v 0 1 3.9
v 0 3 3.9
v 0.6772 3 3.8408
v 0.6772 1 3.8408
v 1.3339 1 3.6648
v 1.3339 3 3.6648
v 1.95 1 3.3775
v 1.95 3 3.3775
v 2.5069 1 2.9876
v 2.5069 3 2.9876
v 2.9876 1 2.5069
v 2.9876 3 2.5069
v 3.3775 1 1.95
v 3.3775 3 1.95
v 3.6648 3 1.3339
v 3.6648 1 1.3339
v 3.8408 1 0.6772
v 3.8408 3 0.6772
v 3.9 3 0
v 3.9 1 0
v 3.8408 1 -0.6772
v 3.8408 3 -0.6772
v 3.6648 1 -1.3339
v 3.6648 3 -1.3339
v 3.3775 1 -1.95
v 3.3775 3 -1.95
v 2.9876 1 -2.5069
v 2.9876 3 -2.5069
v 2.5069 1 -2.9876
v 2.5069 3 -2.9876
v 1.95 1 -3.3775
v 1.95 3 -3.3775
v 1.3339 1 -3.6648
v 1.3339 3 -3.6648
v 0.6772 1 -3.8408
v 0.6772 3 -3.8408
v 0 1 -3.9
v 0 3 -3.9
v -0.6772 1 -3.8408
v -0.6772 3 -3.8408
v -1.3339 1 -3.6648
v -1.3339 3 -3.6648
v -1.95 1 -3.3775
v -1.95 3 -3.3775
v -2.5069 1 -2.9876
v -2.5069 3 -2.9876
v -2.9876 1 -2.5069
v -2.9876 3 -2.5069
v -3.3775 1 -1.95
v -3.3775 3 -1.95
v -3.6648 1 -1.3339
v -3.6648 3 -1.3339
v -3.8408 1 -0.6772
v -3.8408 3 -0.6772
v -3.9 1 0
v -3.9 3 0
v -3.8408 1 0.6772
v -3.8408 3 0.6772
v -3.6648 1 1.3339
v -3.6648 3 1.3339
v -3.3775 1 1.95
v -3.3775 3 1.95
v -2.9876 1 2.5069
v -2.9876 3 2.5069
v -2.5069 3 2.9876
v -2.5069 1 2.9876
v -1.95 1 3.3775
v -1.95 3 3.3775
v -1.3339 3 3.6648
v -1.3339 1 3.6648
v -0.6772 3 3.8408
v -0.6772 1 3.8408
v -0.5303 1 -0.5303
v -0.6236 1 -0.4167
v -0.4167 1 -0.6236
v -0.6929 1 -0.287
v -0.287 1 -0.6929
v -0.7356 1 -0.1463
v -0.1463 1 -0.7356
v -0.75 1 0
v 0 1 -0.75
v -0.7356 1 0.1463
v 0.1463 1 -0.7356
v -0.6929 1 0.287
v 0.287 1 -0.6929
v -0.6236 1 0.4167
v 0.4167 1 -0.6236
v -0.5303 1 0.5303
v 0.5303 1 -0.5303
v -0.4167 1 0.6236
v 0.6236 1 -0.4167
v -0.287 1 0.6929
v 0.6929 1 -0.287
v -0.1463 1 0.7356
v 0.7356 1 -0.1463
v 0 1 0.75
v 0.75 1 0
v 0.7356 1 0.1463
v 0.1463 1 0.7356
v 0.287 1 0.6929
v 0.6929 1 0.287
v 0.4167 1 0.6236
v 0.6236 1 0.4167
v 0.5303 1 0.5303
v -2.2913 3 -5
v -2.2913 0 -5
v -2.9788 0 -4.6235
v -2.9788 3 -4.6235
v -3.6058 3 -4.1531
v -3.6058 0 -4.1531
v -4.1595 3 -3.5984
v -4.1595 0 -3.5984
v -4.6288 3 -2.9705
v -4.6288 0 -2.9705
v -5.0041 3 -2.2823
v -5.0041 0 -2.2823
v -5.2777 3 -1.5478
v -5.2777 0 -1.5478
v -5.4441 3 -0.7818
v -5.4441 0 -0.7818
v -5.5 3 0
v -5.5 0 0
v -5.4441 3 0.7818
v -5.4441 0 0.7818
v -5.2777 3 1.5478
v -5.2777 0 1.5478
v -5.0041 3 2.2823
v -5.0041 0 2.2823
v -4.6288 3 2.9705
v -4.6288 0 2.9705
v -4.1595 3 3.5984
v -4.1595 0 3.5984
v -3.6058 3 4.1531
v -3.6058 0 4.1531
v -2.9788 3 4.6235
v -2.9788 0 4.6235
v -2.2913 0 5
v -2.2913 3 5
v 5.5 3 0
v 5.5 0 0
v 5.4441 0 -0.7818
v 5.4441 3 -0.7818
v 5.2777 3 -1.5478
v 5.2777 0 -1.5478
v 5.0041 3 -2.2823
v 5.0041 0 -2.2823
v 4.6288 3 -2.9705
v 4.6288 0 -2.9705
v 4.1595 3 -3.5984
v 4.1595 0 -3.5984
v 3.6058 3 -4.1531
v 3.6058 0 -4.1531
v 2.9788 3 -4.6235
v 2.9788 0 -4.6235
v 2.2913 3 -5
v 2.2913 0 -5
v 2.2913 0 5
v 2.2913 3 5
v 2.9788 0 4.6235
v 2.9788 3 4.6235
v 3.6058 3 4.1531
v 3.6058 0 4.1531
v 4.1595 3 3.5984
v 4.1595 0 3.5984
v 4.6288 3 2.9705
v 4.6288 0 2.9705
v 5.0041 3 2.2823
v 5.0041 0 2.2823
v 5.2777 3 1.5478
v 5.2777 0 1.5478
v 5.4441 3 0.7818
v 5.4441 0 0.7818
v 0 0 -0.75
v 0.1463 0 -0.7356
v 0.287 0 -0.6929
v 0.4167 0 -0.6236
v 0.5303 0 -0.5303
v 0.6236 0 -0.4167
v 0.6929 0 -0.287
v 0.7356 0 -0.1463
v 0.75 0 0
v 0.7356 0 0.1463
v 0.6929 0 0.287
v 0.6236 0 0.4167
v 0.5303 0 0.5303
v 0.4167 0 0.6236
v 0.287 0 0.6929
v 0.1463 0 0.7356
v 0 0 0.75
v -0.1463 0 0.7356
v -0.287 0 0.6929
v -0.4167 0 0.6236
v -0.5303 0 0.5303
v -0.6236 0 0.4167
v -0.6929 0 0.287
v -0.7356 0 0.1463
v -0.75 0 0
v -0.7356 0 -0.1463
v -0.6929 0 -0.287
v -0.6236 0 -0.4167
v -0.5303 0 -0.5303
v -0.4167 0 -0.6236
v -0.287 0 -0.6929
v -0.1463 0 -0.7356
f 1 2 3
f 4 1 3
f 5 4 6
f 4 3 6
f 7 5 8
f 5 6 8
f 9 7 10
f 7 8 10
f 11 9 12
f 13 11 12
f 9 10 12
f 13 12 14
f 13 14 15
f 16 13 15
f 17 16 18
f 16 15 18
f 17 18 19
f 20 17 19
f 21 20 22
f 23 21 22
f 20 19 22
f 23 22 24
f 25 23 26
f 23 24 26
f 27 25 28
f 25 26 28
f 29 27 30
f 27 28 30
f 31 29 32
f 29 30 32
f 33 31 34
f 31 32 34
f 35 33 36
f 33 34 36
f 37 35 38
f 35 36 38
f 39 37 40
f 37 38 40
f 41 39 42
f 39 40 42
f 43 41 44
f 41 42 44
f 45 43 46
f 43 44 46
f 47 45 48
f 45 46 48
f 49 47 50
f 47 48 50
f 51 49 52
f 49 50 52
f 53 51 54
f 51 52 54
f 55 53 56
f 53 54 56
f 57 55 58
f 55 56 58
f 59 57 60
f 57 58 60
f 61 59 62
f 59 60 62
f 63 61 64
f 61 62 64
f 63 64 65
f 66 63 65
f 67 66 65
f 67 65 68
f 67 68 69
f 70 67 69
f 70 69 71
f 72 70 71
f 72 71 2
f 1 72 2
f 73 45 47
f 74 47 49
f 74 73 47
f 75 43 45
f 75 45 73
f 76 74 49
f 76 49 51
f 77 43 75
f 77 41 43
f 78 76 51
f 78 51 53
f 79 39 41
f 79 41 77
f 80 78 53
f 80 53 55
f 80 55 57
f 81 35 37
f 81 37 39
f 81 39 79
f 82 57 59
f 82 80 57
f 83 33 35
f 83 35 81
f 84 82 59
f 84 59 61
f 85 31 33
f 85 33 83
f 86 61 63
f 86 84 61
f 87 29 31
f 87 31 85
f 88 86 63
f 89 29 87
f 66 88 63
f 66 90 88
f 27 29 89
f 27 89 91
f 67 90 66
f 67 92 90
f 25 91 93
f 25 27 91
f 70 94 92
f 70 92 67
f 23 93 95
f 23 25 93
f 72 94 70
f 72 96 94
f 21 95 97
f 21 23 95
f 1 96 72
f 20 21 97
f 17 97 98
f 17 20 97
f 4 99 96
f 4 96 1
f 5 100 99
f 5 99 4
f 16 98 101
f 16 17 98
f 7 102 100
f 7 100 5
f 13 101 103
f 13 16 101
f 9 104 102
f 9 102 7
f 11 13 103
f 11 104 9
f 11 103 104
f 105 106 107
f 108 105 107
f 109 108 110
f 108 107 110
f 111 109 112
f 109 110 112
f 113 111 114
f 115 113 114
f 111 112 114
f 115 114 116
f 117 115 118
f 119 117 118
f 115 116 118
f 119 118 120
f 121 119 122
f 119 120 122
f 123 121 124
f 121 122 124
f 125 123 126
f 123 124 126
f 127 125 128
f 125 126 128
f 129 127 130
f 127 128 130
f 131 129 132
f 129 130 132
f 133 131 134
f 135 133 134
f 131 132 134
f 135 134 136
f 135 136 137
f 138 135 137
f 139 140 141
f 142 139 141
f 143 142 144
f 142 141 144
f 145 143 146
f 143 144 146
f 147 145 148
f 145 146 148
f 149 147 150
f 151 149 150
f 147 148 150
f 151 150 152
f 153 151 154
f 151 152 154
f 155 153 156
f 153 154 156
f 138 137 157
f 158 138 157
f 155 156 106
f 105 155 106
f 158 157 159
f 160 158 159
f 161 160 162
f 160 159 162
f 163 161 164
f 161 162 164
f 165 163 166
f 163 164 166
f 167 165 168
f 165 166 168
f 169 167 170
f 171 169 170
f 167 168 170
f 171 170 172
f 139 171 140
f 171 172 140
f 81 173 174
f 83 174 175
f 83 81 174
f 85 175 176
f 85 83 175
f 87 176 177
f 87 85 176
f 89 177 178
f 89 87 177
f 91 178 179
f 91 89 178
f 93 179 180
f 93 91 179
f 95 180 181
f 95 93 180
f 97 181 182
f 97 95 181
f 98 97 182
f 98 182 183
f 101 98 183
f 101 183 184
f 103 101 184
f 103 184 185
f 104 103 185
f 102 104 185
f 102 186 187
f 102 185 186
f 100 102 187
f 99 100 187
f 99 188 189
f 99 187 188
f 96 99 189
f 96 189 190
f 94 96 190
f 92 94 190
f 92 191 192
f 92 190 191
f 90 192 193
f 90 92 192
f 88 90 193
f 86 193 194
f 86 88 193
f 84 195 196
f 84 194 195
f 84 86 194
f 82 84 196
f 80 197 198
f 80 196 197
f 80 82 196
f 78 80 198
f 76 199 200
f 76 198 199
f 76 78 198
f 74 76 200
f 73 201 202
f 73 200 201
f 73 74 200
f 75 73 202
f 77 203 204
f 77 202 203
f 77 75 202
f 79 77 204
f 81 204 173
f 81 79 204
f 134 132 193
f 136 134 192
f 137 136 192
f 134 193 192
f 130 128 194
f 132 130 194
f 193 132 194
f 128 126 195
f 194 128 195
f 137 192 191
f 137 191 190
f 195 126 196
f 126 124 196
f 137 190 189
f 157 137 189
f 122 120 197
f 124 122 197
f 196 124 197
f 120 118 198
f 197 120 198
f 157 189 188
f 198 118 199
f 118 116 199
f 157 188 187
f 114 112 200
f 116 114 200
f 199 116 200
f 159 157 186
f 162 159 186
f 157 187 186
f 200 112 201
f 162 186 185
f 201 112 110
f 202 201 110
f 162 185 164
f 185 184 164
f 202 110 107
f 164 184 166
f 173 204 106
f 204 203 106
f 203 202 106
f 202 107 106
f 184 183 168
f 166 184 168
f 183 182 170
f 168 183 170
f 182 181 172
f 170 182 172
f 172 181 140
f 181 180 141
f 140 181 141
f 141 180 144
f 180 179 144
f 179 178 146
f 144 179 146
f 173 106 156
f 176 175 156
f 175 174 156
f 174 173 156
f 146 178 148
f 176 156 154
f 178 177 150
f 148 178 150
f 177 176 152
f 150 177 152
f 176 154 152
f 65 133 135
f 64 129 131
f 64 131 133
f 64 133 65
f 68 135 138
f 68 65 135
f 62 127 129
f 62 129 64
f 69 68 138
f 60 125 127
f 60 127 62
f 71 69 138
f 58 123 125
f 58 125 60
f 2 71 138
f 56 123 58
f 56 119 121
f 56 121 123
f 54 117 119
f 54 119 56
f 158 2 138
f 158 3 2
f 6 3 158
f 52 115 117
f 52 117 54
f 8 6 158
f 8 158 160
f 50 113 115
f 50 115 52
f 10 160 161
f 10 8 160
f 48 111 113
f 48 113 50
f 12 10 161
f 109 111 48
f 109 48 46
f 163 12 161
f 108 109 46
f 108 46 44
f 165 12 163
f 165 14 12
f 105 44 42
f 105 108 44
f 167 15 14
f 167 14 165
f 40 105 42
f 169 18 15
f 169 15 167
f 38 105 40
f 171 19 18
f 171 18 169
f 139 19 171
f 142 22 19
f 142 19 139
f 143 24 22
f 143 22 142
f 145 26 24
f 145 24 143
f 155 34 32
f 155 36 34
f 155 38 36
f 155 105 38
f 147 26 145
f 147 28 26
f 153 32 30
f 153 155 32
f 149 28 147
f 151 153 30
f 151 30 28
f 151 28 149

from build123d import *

# Parameters (mm, degrees)
SKETCH_1_R          = 5
EXTRUDE_1_DEPTH     = 3
SKETCH_2_R          = 3.9
CUT_EXTRUDE_1_DEPTH = 2
SKETCH_3_R          = 0.75
CUT_EXTRUDE_2_DEPTH = 8.697402159


with BuildPart() as part:
    # 草图1 → 凸台-拉伸1 (new body)
    with BuildSketch(Plane(origin=(0, 0, 0), x_dir=(1, 0, 0), z_dir=(0, 1, 0))):
        with BuildLine():
            ThreePointArc((-2.291287847, 5), (-5.5, 0), (-2.291287847, -5))
            Line((-2.291287847, -5), (0, -5))
            ThreePointArc((0, -5), (-5, 0), (0, 5))
            Line((0, 5), (-2.291287847, 5))
        make_face()
        with BuildLine():
            ThreePointArc((5, 0), (3.535533906, -3.535533906), (0, -5))
            Line((0, -5), (2.291287847, -5))
            ThreePointArc((2.291287847, -5), (4.628827236, -2.970514841), (5.5, 0))
            ThreePointArc((5.5, 0), (4.628827236, 2.970514841), (2.291287847, 5))
            Line((2.291287847, 5), (0, 5))
            ThreePointArc((0, 5), (3.535533906, 3.535533906), (5, 0))
        make_face()
        Circle(SKETCH_1_R)
    extrude(amount=EXTRUDE_1_DEPTH)

    # 草图2 → 切除-拉伸1 (cut)
    with BuildSketch(Plane(origin=(0, 3, 0), x_dir=(1, 0, 0), z_dir=(0, 1, 0))):
        with Locations(Location((0, 0, 0), (0, 0, 270))):
            Circle(SKETCH_2_R)
    extrude(amount=-CUT_EXTRUDE_1_DEPTH, mode=Mode.SUBTRACT)

    # 草图3 → 切除-拉伸2 (cut, through all)
    with BuildSketch(Plane(origin=(0, 1, 0), x_dir=(-1, 0, 0), z_dir=(0, -1, 0))):
        with Locations(Location((0, 0, 0), (0, 0, 90))):
            Circle(SKETCH_3_R)
    extrude(amount=CUT_EXTRUDE_2_DEPTH, mode=Mode.SUBTRACT)


solid = part.part
